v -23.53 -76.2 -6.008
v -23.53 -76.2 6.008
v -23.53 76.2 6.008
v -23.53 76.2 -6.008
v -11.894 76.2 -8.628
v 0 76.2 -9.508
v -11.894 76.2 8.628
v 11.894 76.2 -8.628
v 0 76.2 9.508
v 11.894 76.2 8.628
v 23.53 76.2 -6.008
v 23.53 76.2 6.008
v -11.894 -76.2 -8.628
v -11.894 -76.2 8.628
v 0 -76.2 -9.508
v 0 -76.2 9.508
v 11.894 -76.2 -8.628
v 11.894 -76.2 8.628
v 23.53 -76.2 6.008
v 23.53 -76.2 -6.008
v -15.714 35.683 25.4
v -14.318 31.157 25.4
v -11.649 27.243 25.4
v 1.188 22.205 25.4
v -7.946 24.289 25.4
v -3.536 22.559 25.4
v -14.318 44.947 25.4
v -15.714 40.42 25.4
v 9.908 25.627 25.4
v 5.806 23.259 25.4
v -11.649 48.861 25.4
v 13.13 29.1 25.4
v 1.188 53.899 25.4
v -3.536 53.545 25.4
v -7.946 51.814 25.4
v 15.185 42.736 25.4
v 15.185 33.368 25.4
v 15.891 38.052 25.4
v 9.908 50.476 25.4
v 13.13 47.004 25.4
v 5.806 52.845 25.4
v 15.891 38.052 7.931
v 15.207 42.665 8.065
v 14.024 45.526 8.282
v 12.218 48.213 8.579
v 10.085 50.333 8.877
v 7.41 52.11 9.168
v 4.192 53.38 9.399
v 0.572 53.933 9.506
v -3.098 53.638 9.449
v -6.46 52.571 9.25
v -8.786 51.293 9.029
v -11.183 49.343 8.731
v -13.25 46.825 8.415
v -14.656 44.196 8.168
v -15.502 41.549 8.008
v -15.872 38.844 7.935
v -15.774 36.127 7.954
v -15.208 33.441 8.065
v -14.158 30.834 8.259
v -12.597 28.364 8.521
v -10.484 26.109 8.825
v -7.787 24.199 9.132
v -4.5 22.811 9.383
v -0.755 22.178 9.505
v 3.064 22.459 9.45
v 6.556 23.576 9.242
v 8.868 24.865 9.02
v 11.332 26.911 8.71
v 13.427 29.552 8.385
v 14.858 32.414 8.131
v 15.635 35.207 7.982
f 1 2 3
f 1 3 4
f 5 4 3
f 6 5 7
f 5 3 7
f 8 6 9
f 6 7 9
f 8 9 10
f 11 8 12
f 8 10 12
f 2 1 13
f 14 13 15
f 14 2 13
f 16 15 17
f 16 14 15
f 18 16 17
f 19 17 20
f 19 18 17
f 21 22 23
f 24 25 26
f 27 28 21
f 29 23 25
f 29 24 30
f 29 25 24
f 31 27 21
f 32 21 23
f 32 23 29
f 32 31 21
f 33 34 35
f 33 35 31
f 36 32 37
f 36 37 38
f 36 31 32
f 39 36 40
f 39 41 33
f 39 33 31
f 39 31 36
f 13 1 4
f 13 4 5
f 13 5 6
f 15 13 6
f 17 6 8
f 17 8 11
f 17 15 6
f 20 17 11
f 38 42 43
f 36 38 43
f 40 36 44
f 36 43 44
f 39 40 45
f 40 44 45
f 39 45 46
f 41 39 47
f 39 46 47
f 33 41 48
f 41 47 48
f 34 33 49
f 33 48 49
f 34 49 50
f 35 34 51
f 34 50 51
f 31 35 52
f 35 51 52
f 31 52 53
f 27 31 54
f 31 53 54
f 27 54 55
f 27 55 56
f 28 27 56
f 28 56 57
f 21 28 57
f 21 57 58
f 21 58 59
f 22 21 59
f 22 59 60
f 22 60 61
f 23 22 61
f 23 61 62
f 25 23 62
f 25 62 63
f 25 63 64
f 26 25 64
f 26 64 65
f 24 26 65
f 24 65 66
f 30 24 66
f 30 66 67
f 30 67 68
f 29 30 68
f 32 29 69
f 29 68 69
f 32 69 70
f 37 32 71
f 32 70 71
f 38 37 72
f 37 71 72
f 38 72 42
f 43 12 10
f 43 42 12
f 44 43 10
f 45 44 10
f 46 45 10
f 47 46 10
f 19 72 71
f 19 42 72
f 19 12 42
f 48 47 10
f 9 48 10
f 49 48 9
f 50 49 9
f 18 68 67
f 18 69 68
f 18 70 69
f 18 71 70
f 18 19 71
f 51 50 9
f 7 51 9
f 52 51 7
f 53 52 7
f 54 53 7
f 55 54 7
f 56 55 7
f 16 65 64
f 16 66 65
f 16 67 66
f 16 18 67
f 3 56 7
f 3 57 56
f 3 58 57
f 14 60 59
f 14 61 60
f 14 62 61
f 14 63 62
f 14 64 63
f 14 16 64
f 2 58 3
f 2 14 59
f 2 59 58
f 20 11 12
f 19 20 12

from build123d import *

# Parameters (mm, degrees)
F1_DEPTH = 76.2
F2_R     = 15.891497
F3_DEPTH = 25.4


with BuildPart() as f1:
    # F0 (on Front) → F1 (new body, symmetric)
    with BuildSketch(Plane.XZ):
        with BuildLine():
            ThreePointArc((23.529917, 6.007624), (0, 9.508228), (-23.529917, 6.007624))
            Line((-23.529917, 6.007624), (-23.529917, -6.007624))
            ThreePointArc((-23.529917, -6.007624), (0, -9.508228), (23.529917, -6.007624))
            Line((23.529917, -6.007624), (23.529917, 6.007624))
        make_face()
    extrude(amount=F1_DEPTH, both=True)

    # F2 (on Top) → F3 (join)
    with BuildSketch(Plane.XY):
        with Locations((0, 38.051773)):
            Circle(F2_R)
    extrude(amount=F3_DEPTH)


solid = f1.part
